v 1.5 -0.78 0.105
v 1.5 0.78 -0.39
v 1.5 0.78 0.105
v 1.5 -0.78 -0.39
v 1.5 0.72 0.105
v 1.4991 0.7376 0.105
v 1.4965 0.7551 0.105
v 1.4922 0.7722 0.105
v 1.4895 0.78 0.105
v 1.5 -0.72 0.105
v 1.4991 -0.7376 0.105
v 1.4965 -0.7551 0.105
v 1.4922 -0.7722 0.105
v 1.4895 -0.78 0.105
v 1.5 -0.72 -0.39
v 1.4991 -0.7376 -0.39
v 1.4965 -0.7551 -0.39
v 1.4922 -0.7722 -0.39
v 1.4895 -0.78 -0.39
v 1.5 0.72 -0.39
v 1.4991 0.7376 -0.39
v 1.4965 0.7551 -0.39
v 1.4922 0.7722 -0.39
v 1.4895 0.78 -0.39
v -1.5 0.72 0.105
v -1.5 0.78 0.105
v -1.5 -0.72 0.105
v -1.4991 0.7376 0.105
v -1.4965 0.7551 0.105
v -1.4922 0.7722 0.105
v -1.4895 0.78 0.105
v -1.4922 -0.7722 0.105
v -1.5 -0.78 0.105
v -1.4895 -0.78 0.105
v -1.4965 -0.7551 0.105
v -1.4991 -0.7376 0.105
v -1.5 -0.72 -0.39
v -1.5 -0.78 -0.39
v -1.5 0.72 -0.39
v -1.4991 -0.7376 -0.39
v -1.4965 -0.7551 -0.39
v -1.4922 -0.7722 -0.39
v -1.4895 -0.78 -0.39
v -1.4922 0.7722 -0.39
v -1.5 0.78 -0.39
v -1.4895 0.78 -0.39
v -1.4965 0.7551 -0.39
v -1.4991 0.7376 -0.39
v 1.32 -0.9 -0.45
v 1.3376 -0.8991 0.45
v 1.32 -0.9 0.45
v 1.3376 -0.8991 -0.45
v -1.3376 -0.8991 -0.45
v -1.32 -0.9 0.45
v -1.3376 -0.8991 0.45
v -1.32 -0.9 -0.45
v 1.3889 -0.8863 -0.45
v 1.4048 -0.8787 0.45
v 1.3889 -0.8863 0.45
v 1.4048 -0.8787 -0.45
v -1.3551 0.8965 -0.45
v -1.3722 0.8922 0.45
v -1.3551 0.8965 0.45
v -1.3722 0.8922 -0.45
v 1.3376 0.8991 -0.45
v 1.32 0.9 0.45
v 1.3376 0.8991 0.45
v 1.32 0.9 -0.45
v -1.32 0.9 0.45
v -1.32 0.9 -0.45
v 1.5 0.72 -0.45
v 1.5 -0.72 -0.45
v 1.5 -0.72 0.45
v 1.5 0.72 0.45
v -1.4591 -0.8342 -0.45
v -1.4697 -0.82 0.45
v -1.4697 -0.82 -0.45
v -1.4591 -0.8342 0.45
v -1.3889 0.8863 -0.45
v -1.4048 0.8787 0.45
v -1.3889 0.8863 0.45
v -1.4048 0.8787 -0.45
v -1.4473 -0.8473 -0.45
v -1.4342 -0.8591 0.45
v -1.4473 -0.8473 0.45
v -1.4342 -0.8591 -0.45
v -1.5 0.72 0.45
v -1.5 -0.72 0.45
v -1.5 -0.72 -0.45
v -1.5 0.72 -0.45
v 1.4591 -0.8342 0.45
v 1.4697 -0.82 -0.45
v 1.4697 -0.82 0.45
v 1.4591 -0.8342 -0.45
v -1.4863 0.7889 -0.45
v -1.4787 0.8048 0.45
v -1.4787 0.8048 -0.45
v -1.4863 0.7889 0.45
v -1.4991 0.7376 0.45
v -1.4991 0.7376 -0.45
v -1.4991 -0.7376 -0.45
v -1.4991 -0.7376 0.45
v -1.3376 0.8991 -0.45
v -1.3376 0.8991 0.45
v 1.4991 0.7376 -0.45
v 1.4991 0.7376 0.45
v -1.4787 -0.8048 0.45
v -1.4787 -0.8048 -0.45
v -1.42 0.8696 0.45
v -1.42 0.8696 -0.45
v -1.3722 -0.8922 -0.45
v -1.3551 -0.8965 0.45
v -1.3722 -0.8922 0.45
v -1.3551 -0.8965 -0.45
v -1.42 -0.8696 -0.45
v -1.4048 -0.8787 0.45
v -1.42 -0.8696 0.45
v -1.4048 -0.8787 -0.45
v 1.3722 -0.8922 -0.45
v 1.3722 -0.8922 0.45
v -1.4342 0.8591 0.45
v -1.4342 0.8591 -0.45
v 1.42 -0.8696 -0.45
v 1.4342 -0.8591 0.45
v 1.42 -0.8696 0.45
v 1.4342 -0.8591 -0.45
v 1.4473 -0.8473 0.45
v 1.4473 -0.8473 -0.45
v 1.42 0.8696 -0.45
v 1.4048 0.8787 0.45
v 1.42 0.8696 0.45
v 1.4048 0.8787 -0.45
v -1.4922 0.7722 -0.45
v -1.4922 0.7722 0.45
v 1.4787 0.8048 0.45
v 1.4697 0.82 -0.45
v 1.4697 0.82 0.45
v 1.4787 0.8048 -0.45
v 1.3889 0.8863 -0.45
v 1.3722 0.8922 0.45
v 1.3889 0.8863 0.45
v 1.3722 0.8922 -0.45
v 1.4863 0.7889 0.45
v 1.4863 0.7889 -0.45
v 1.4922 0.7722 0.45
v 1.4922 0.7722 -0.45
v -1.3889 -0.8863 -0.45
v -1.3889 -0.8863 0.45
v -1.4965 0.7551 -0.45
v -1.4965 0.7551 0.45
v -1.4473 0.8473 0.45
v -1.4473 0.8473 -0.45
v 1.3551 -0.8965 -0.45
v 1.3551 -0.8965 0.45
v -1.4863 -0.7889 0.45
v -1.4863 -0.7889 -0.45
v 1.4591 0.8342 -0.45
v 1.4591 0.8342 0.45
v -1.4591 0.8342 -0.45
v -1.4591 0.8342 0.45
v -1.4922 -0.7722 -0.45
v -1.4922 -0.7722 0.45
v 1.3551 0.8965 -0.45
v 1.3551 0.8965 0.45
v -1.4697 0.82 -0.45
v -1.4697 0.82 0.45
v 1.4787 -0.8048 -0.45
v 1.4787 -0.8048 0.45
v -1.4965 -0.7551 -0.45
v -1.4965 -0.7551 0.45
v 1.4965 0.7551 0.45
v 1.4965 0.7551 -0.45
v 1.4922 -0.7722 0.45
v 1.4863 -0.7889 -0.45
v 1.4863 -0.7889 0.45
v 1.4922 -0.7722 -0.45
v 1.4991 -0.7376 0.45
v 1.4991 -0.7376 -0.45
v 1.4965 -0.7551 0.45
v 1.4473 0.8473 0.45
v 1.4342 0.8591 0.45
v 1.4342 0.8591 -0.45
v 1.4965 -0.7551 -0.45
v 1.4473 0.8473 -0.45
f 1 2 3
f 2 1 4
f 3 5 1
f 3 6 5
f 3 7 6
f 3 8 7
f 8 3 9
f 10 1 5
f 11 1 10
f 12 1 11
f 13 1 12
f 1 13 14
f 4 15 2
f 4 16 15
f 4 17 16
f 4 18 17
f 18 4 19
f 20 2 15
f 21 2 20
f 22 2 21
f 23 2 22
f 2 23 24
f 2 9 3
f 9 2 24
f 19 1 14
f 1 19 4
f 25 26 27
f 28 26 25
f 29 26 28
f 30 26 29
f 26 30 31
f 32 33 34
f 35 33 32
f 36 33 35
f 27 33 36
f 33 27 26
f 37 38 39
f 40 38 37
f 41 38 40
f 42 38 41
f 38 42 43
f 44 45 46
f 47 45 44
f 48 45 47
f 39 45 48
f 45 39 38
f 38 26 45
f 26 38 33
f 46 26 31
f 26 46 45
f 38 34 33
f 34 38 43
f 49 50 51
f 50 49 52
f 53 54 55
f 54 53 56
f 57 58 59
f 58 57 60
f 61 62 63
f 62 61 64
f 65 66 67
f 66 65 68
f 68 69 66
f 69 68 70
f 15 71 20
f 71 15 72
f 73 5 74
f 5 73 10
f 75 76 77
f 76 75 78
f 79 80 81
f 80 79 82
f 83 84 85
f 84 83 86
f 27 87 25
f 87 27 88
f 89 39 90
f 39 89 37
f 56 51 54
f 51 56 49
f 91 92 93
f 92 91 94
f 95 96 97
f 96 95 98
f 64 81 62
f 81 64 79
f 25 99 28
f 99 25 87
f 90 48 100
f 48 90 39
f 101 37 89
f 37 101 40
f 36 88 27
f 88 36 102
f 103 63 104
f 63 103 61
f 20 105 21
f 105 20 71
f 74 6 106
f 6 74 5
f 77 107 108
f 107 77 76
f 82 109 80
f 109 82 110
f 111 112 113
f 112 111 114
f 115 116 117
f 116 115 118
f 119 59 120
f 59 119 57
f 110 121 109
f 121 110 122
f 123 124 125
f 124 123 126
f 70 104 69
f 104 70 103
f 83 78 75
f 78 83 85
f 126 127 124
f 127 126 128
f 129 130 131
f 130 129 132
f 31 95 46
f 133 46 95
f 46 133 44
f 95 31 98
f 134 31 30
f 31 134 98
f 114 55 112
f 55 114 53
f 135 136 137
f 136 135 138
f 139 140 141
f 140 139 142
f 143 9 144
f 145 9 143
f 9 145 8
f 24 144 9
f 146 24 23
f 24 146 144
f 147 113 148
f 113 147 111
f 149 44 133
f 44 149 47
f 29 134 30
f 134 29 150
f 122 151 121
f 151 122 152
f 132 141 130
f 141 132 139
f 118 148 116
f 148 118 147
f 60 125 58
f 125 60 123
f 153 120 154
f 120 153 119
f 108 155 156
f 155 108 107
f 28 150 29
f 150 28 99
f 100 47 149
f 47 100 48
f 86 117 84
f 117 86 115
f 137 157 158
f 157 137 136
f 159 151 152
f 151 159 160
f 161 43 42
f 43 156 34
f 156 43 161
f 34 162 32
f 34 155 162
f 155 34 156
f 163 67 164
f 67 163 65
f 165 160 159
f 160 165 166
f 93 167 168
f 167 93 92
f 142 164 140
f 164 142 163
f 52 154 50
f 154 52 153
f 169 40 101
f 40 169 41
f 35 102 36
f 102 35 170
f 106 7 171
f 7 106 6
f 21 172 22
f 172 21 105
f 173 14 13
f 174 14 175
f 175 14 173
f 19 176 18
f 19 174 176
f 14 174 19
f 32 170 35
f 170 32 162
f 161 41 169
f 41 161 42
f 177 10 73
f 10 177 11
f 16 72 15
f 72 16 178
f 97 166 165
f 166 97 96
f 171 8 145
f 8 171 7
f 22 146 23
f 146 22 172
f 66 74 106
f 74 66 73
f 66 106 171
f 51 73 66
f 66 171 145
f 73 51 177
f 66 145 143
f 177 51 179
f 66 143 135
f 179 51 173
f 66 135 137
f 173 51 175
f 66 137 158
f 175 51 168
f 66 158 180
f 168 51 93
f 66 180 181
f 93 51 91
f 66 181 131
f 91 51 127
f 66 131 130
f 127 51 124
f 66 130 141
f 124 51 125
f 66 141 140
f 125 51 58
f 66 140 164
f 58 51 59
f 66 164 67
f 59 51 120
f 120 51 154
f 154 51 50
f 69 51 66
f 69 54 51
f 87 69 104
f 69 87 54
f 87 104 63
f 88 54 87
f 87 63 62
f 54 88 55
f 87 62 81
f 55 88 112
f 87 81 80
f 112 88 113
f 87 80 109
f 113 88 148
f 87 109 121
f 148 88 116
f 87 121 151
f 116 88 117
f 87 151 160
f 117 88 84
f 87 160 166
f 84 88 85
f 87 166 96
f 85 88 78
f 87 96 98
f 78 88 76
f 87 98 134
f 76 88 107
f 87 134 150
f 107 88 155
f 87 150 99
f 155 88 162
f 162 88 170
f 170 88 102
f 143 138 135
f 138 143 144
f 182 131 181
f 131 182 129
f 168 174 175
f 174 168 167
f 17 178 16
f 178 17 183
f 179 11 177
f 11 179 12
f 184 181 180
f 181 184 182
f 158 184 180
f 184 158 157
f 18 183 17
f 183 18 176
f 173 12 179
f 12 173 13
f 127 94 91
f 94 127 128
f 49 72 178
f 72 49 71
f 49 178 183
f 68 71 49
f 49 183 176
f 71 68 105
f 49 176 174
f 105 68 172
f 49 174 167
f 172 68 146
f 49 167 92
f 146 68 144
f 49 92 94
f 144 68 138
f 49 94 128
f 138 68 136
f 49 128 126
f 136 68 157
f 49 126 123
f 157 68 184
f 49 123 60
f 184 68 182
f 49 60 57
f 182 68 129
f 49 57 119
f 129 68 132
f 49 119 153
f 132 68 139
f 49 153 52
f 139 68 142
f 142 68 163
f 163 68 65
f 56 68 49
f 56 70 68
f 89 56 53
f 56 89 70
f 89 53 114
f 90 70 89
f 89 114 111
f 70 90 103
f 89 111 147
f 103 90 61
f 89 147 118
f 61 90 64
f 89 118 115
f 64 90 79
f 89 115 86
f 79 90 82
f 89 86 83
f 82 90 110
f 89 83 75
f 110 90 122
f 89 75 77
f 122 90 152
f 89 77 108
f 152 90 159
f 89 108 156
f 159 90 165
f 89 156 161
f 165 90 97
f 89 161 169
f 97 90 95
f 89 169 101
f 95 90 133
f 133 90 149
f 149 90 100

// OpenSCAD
$fn=64;

module smd_body(size=[3.0, 1.8, 0.9], corner_r=0.18) {
    x=size[0]; y=size[1]; z=size[2];
    r=min(corner_r, x/2, y/2);
    translate([0,0,0])
    linear_extrude(height=z, center=true)
        offset(r=r)
            square([x-2*r, y-2*r], center=true);
}

module smd_lead(size=[3.0, 1.8, 0.9], lead_len=0.35, lead_th=0.08, lead_inset=0.12) {
    x=size[0]; y=size[1]; z=size[2];
    lx=lead_len;
    ly=y-2*lead_inset;
    lz=z*0.55;
    translate([0,0,0])
    union() {
        translate([ x/2 - lx/2, 0, -z/2 + lz/2 + lead_th])
            cube([lx, ly, lz], center=true);
        translate([-x/2 + lx/2, 0, -z/2 + lz/2 + lead_th])
            cube([lx, ly, lz], center=true);
    }
}

module smd(size=[3.0, 1.8, 0.9]) {
    union() {
        color([0.15,0.15,0.15]) smd_body(size=size, corner_r=0.18);
        color([0.75,0.75,0.78]) smd_lead(size=size, lead_len=0.35, lead_th=0.06, lead_inset=0.12);
    }
}

smd([3.0, 1.8, 0.9]);
